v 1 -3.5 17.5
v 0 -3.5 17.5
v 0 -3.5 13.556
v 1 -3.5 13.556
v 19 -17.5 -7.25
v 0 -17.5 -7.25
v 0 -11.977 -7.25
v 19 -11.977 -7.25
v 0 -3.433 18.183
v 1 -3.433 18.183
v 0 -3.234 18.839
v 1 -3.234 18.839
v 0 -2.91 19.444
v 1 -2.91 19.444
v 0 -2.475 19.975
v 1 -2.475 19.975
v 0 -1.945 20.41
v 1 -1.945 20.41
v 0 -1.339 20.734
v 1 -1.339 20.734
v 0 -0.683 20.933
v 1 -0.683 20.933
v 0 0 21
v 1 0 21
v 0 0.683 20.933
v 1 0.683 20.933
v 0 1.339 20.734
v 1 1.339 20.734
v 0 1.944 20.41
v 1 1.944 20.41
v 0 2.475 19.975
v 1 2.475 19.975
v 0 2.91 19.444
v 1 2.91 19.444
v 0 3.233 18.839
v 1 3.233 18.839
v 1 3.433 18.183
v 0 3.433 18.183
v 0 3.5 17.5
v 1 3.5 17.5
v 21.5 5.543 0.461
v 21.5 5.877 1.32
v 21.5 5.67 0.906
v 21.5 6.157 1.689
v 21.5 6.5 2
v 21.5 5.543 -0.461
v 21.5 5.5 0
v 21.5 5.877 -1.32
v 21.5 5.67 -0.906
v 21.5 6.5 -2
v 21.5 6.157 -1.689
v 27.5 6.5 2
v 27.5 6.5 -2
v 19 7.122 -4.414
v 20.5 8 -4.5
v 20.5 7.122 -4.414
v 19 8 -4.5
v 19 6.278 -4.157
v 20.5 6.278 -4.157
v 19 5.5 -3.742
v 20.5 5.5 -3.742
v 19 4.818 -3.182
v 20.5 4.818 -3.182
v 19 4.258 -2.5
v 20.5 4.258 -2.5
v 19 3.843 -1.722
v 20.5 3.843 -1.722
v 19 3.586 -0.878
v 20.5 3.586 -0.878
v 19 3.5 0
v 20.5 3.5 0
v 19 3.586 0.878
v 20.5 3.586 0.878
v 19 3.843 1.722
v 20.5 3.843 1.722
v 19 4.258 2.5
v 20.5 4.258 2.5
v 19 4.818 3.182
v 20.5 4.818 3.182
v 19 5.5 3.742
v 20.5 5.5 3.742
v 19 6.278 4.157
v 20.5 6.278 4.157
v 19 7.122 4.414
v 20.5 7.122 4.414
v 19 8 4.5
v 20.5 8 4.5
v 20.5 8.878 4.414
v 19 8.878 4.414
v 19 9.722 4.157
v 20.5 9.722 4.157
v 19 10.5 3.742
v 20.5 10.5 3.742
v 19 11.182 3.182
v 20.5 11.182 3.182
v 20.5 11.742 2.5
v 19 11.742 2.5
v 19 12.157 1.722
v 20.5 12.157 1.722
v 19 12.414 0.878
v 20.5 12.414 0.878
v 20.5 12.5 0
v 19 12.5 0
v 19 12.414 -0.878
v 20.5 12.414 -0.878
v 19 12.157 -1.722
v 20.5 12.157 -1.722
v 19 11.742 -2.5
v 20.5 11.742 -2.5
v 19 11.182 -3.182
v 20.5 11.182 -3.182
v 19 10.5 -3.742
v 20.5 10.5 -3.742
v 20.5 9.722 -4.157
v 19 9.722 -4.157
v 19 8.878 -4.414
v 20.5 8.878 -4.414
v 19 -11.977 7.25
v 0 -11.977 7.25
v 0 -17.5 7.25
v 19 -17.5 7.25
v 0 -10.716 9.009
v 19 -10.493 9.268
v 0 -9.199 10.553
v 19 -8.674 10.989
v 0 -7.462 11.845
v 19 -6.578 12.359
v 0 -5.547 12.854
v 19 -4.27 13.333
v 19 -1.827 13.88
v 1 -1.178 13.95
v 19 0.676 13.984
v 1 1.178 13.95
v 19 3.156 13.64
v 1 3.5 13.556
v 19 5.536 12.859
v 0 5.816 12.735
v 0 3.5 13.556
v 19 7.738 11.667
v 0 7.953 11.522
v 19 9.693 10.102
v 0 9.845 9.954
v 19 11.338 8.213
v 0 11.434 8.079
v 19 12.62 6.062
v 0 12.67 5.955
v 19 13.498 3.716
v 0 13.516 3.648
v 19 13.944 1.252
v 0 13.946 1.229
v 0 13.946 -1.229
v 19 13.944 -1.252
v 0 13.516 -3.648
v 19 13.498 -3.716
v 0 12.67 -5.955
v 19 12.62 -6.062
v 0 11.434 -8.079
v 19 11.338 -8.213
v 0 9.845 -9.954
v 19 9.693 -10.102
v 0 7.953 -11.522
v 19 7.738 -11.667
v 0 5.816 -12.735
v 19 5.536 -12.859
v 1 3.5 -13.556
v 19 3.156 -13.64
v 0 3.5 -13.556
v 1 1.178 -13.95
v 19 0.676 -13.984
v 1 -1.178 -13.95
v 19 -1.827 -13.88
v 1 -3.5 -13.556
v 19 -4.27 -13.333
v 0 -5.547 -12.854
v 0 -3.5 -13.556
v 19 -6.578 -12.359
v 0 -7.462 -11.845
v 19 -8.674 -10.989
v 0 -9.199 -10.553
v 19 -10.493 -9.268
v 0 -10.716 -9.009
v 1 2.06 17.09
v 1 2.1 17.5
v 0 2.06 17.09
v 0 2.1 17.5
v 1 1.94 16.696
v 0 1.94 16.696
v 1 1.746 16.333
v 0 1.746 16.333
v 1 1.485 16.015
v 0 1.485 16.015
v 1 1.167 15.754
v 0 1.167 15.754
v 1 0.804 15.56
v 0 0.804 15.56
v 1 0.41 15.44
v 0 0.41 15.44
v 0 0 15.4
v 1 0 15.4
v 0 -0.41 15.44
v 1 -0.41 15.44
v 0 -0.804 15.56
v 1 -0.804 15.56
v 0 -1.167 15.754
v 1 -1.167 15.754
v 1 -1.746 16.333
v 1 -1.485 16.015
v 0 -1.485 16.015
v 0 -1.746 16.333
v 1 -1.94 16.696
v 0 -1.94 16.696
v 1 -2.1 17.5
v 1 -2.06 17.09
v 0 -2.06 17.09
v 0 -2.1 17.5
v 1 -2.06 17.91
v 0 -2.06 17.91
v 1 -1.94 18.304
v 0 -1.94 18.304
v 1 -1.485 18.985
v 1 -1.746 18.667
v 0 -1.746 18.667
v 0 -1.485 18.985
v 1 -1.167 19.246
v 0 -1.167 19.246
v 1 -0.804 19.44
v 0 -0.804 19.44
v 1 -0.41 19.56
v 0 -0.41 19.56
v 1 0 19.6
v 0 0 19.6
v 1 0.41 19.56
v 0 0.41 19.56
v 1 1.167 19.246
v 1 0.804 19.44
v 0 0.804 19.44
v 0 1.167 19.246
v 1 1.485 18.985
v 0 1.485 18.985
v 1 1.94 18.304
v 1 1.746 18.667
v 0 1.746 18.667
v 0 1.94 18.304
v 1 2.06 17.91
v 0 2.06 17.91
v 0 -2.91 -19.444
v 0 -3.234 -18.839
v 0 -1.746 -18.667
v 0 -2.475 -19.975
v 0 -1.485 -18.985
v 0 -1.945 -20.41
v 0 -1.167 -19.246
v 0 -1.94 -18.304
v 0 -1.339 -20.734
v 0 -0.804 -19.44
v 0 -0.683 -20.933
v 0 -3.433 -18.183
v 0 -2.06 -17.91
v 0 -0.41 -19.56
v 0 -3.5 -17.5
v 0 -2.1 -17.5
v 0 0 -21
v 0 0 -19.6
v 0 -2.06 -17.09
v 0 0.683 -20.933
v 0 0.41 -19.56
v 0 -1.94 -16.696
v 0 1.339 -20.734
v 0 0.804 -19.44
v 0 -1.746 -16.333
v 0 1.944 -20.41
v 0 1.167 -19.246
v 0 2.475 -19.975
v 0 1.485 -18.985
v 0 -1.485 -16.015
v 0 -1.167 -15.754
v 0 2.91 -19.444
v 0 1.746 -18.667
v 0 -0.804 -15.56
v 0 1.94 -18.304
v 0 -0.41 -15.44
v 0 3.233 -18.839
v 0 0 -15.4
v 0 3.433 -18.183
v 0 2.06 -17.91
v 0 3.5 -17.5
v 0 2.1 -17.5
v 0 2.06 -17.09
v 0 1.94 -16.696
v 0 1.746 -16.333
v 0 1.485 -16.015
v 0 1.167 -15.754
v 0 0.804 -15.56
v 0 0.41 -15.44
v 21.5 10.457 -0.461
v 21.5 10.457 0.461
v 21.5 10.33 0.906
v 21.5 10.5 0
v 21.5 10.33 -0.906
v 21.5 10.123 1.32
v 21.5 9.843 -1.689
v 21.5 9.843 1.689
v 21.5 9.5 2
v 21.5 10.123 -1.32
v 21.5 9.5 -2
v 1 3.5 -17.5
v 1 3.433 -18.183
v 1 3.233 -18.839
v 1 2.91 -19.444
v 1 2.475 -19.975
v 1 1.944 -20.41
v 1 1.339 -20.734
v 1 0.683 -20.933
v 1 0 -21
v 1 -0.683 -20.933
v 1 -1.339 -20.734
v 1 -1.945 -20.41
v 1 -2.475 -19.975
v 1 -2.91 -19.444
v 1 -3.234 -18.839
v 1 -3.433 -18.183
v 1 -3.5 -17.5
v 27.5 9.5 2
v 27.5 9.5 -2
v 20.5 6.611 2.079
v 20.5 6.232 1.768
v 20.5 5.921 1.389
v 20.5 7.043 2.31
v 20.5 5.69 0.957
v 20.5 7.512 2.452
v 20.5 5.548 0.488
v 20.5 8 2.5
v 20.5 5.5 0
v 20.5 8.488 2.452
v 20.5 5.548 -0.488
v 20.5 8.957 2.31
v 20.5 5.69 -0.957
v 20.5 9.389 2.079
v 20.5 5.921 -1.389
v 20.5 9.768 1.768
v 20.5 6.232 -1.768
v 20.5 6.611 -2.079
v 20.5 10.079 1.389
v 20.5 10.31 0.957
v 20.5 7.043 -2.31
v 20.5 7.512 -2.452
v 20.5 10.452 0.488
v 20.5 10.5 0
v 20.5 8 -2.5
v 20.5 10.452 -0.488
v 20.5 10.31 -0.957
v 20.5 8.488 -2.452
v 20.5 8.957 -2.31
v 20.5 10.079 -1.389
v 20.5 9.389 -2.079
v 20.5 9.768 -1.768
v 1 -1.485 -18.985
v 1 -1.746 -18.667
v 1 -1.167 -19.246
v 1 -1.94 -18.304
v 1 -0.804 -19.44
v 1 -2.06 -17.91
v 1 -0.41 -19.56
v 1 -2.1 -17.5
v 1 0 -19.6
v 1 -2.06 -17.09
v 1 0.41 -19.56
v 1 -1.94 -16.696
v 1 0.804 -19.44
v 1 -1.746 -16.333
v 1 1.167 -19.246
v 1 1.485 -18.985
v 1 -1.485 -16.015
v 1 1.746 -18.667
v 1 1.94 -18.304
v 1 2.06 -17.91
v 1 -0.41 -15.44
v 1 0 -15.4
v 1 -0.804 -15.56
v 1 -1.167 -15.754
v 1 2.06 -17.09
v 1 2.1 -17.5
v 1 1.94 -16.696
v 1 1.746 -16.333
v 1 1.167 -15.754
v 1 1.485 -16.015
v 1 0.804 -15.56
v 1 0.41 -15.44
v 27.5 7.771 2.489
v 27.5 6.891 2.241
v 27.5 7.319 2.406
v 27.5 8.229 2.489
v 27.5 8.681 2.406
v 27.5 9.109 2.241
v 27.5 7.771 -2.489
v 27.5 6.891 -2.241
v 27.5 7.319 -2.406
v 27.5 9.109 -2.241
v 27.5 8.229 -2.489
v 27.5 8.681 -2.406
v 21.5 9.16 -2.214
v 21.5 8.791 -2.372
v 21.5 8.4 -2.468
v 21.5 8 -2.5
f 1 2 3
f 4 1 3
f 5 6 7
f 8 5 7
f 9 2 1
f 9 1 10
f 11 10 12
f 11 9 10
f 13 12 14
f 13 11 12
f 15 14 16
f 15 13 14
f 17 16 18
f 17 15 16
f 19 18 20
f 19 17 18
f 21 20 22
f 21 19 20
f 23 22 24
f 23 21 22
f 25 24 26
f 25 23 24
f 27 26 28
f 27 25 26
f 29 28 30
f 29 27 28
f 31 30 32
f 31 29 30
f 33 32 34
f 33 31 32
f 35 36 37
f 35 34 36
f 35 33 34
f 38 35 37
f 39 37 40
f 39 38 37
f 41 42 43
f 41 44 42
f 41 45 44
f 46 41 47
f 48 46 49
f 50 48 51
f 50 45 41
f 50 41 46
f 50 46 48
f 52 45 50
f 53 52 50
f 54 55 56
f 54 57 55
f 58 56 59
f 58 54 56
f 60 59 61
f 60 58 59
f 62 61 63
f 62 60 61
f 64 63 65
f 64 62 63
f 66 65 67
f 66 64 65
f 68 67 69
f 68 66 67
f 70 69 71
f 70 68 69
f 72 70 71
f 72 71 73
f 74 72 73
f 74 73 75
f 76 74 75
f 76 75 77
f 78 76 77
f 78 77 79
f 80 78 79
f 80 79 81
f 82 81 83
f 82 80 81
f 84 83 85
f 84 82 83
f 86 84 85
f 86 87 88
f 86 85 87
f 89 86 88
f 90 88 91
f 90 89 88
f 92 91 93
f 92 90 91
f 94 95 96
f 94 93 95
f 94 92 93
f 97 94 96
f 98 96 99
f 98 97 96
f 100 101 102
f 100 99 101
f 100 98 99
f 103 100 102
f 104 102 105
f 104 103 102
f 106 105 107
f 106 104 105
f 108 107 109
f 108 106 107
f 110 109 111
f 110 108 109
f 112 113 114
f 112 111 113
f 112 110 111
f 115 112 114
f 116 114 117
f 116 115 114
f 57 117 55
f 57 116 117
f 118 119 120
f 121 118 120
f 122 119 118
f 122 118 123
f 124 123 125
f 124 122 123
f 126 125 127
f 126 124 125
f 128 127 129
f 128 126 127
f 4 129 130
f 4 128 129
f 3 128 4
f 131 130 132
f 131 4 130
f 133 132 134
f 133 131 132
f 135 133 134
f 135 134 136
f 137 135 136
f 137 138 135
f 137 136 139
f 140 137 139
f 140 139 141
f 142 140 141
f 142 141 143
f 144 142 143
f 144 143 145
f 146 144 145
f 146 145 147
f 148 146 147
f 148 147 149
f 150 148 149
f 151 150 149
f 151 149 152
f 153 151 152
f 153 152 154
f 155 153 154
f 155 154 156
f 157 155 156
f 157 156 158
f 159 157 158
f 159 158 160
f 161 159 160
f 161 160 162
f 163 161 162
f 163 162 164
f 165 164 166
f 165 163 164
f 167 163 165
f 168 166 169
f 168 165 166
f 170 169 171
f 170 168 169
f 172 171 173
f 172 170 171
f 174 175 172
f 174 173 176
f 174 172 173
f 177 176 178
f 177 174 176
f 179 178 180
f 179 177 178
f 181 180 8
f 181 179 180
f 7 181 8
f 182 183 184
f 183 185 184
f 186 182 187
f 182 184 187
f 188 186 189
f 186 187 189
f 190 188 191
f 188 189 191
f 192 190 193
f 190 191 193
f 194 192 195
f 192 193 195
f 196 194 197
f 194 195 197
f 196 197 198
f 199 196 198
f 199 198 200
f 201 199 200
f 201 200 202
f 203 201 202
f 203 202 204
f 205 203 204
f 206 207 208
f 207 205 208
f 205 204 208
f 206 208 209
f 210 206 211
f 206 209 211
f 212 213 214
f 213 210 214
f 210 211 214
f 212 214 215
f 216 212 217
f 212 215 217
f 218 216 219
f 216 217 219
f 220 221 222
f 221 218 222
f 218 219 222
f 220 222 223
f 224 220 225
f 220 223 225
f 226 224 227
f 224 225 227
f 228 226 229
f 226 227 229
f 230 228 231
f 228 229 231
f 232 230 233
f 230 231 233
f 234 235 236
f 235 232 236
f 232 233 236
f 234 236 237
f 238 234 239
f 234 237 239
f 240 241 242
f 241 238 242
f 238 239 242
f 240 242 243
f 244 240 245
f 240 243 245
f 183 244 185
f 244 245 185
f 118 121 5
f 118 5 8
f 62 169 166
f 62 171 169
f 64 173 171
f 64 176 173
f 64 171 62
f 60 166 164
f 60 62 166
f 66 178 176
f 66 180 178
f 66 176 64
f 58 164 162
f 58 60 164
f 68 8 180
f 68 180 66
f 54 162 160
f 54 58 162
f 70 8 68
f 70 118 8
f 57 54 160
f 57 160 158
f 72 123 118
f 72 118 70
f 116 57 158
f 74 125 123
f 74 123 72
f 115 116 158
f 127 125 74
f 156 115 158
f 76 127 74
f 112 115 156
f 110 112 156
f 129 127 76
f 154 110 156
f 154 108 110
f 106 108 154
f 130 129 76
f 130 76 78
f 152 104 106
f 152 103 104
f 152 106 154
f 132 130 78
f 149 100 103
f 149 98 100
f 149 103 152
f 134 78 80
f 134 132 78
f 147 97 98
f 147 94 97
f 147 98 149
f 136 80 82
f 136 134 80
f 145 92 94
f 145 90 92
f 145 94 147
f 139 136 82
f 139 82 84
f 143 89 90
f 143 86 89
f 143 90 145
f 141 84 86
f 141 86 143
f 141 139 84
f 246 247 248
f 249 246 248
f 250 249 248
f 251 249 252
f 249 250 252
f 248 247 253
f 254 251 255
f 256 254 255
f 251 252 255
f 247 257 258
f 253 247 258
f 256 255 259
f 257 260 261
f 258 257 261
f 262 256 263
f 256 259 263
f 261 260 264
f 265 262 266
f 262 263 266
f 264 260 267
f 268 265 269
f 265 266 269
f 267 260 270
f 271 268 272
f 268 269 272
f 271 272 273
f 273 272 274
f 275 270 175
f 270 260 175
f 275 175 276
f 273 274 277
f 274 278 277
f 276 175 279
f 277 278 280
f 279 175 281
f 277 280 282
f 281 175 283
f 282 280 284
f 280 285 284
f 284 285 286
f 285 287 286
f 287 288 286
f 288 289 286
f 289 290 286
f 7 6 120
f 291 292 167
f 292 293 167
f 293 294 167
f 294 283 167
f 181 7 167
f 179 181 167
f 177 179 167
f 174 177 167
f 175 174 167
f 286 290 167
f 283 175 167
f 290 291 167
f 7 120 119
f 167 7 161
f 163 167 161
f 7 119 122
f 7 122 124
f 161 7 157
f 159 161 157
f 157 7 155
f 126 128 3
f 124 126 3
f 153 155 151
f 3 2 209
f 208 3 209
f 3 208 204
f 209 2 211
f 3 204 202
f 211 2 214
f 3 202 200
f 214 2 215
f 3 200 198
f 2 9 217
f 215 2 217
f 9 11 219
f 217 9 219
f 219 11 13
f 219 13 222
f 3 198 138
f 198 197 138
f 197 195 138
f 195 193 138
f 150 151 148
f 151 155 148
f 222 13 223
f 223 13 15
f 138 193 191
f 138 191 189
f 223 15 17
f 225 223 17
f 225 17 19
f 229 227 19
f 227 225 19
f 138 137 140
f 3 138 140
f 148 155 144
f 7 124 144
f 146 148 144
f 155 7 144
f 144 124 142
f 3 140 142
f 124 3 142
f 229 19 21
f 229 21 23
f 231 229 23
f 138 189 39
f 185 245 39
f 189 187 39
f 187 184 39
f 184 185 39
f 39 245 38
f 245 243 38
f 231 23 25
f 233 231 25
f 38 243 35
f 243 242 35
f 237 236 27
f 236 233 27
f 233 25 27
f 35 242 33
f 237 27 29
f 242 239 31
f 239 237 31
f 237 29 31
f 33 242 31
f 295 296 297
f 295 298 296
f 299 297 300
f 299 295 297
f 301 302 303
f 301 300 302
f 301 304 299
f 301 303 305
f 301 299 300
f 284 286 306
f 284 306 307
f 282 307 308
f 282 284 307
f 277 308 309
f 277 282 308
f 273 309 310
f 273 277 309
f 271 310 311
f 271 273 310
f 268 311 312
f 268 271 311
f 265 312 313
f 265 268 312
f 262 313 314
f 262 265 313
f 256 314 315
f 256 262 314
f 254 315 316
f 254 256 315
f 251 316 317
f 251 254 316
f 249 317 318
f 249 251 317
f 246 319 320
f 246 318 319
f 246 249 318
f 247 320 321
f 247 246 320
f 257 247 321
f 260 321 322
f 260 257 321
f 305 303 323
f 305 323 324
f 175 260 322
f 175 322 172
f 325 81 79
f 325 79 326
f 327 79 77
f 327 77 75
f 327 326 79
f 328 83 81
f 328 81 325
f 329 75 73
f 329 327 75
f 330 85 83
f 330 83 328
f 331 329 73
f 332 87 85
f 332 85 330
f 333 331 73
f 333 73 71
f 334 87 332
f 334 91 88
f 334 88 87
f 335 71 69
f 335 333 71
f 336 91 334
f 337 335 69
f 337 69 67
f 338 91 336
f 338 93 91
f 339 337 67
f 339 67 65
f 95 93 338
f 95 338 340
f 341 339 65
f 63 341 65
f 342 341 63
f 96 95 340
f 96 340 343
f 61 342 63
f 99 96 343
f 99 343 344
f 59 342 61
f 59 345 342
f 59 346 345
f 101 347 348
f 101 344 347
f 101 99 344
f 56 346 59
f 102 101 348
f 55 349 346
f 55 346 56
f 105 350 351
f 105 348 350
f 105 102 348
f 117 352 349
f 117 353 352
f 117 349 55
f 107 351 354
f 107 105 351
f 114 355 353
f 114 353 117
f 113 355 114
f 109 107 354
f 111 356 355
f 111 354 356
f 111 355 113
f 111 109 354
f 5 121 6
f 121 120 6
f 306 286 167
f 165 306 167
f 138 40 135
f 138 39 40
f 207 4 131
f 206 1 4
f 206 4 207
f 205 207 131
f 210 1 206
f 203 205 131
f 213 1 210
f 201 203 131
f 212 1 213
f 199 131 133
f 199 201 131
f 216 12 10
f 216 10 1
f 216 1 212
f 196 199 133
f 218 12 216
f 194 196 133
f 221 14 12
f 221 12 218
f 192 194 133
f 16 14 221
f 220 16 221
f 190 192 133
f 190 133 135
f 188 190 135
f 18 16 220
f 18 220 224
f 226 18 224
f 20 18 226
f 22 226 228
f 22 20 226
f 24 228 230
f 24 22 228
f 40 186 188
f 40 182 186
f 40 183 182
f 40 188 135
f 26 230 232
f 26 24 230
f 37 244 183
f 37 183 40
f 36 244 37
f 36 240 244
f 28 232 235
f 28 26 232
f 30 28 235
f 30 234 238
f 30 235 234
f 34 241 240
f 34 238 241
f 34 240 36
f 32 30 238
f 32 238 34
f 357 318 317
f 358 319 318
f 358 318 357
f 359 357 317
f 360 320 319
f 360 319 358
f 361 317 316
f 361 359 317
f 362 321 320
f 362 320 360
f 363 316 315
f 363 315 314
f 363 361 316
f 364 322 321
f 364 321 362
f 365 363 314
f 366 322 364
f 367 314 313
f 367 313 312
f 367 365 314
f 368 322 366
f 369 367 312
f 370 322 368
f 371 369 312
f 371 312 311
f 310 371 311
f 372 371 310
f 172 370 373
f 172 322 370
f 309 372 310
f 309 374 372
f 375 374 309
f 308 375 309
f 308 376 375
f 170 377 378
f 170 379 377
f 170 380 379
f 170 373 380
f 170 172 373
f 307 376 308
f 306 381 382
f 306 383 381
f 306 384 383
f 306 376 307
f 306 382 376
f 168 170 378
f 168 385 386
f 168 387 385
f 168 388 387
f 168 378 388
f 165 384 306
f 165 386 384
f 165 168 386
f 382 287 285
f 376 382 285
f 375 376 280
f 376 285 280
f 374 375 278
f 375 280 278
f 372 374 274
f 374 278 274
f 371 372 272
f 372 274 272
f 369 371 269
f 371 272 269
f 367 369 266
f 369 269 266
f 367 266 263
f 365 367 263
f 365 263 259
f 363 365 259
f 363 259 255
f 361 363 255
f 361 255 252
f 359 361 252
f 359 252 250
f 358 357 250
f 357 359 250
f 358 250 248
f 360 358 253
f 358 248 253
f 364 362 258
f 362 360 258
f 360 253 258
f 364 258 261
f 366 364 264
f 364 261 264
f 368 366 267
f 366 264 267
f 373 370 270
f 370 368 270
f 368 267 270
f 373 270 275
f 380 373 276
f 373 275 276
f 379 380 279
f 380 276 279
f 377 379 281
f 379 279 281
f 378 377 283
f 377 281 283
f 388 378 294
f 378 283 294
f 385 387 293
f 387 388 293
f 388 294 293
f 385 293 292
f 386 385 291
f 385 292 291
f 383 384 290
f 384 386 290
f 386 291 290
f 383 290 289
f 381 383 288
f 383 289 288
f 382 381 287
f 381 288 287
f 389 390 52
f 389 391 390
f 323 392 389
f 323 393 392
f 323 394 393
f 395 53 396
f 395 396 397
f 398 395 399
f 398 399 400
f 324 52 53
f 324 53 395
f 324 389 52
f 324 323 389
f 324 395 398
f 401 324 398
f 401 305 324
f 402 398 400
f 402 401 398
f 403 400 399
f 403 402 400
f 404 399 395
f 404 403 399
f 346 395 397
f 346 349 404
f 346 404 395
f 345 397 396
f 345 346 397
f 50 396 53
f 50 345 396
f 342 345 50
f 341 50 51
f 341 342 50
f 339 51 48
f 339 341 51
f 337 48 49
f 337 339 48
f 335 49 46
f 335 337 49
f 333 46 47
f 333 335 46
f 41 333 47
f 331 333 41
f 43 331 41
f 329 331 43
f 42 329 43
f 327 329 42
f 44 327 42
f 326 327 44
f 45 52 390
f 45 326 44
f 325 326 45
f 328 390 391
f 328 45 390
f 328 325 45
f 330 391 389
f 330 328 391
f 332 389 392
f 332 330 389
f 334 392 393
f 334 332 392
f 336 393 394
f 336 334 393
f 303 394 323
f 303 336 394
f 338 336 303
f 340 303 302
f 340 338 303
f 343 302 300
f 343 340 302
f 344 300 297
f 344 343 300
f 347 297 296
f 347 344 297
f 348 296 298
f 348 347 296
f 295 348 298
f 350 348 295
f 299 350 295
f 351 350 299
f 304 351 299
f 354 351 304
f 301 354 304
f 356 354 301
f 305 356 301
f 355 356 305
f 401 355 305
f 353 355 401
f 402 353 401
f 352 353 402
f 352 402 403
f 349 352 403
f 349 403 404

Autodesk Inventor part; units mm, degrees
ref_plane "YZ Plane" through (0, 0, 0) normal (1, 0, 0) x (0, 1, 0)
ref_plane "XZ Plane" through (0, 0, 0) normal (0, 1, 0) x (-1, 0, 0)
ref_plane "XY Plane" through (0, 0, 0) normal (0, 0, 1) x (1, 0, 0)
sketch "Sketch1" plane through (0, 0, 0) normal (1, 0, 0) x (0, 1, 0)
  circle A0 centre (0, 0) radius 14
  line L0 (-6.3479, 7.25) -> (-17.5, 7.25)
  line L1 (-17.5, 7.25) -> (-17.5, -7.25)
  line L2 (-17.5, -7.25) -> (-6.3479, -7.25)
  circle A1 centre (-0.0001, 17.5) radius 3.5
  circle A2 centre (-0.0001, 17.5) radius 2.1
  line L3 (3.4999, 17.5) -> (3.4999, 13.5555)
  line L4 (-3.5001, 17.5) -> (-3.4999, 13.5555)
  line L5 (-14, 0) -> (14, 0)
  circle A3 centre (-0.0001, -17.5) radius 3.5
  circle A4 centre (-0.0001, -17.5) radius 2.1
  line L6 (3.4999, -17.5) -> (3.4999, -13.5555)
  line L7 (-3.5001, -17.5) -> (-3.4999, -13.5555)
  point P0 (-11.9765, -7.25)
  point P1 (-11.9765, 7.25)
  dimension "d0" = 28
  dimension "d7" = 14.5
  dimension "d8" = 7.25
  dimension "d9" = 17.5
  dimension "d12" = 7
  dimension "d13" = 4.2
  dimension "d14" = 17.5
extrude "Extrusion1" add sketch "Sketch1" along normal blind 19 contours L5 A0 | A0 L5 | A0 L2 L1 L0
extrude "Extrusion2" add sketch "Sketch1" along normal blind 1 contours A0 A1 L3 | L6 A3 A0 | A0 L4 A1 | A1 | A3 L7 A0 | A3
sketch "Sketch3" plane through (19, 0, 0) normal (1, 0, 0) x (0, 0, -1)
  line L0 (0, 0) -> (0, 8)
  circle A0 centre (0, 8) radius 4.5
  circle A1 centre (0, 8) radius 2.5
  dimension "d17" = 8
  dimension "d18" = 9
  dimension "d19" = 5
extrude "Extrusion3" add sketch "Sketch3" along normal blind 1.5
extrude "Extrusion4" add sketch "Sketch3" along normal blind 2.5 contours A1
sketch "Sketch5" plane through (21.5, 8, 0) normal (1, 0, 0) x (0, 0, -1)
  circle A0 centre (0, 0) radius 2.5 projected
  line L0 (-2, 1.5) -> (2, 1.5)
  circle A1 centre (0, 0) radius 2.5 projected
  line L1 (-2.5, 0) -> (2.5, 0)
  line L2 (-2, -1.5) -> (2, -1.5)
  point P0 (0, -8)
  dimension "d24" = 1.5
extrude "Extrusion5" add sketch "Sketch5" along normal blind 6 contours L1 A0 L0 | A0 L2 L1
properties part number "motor"
